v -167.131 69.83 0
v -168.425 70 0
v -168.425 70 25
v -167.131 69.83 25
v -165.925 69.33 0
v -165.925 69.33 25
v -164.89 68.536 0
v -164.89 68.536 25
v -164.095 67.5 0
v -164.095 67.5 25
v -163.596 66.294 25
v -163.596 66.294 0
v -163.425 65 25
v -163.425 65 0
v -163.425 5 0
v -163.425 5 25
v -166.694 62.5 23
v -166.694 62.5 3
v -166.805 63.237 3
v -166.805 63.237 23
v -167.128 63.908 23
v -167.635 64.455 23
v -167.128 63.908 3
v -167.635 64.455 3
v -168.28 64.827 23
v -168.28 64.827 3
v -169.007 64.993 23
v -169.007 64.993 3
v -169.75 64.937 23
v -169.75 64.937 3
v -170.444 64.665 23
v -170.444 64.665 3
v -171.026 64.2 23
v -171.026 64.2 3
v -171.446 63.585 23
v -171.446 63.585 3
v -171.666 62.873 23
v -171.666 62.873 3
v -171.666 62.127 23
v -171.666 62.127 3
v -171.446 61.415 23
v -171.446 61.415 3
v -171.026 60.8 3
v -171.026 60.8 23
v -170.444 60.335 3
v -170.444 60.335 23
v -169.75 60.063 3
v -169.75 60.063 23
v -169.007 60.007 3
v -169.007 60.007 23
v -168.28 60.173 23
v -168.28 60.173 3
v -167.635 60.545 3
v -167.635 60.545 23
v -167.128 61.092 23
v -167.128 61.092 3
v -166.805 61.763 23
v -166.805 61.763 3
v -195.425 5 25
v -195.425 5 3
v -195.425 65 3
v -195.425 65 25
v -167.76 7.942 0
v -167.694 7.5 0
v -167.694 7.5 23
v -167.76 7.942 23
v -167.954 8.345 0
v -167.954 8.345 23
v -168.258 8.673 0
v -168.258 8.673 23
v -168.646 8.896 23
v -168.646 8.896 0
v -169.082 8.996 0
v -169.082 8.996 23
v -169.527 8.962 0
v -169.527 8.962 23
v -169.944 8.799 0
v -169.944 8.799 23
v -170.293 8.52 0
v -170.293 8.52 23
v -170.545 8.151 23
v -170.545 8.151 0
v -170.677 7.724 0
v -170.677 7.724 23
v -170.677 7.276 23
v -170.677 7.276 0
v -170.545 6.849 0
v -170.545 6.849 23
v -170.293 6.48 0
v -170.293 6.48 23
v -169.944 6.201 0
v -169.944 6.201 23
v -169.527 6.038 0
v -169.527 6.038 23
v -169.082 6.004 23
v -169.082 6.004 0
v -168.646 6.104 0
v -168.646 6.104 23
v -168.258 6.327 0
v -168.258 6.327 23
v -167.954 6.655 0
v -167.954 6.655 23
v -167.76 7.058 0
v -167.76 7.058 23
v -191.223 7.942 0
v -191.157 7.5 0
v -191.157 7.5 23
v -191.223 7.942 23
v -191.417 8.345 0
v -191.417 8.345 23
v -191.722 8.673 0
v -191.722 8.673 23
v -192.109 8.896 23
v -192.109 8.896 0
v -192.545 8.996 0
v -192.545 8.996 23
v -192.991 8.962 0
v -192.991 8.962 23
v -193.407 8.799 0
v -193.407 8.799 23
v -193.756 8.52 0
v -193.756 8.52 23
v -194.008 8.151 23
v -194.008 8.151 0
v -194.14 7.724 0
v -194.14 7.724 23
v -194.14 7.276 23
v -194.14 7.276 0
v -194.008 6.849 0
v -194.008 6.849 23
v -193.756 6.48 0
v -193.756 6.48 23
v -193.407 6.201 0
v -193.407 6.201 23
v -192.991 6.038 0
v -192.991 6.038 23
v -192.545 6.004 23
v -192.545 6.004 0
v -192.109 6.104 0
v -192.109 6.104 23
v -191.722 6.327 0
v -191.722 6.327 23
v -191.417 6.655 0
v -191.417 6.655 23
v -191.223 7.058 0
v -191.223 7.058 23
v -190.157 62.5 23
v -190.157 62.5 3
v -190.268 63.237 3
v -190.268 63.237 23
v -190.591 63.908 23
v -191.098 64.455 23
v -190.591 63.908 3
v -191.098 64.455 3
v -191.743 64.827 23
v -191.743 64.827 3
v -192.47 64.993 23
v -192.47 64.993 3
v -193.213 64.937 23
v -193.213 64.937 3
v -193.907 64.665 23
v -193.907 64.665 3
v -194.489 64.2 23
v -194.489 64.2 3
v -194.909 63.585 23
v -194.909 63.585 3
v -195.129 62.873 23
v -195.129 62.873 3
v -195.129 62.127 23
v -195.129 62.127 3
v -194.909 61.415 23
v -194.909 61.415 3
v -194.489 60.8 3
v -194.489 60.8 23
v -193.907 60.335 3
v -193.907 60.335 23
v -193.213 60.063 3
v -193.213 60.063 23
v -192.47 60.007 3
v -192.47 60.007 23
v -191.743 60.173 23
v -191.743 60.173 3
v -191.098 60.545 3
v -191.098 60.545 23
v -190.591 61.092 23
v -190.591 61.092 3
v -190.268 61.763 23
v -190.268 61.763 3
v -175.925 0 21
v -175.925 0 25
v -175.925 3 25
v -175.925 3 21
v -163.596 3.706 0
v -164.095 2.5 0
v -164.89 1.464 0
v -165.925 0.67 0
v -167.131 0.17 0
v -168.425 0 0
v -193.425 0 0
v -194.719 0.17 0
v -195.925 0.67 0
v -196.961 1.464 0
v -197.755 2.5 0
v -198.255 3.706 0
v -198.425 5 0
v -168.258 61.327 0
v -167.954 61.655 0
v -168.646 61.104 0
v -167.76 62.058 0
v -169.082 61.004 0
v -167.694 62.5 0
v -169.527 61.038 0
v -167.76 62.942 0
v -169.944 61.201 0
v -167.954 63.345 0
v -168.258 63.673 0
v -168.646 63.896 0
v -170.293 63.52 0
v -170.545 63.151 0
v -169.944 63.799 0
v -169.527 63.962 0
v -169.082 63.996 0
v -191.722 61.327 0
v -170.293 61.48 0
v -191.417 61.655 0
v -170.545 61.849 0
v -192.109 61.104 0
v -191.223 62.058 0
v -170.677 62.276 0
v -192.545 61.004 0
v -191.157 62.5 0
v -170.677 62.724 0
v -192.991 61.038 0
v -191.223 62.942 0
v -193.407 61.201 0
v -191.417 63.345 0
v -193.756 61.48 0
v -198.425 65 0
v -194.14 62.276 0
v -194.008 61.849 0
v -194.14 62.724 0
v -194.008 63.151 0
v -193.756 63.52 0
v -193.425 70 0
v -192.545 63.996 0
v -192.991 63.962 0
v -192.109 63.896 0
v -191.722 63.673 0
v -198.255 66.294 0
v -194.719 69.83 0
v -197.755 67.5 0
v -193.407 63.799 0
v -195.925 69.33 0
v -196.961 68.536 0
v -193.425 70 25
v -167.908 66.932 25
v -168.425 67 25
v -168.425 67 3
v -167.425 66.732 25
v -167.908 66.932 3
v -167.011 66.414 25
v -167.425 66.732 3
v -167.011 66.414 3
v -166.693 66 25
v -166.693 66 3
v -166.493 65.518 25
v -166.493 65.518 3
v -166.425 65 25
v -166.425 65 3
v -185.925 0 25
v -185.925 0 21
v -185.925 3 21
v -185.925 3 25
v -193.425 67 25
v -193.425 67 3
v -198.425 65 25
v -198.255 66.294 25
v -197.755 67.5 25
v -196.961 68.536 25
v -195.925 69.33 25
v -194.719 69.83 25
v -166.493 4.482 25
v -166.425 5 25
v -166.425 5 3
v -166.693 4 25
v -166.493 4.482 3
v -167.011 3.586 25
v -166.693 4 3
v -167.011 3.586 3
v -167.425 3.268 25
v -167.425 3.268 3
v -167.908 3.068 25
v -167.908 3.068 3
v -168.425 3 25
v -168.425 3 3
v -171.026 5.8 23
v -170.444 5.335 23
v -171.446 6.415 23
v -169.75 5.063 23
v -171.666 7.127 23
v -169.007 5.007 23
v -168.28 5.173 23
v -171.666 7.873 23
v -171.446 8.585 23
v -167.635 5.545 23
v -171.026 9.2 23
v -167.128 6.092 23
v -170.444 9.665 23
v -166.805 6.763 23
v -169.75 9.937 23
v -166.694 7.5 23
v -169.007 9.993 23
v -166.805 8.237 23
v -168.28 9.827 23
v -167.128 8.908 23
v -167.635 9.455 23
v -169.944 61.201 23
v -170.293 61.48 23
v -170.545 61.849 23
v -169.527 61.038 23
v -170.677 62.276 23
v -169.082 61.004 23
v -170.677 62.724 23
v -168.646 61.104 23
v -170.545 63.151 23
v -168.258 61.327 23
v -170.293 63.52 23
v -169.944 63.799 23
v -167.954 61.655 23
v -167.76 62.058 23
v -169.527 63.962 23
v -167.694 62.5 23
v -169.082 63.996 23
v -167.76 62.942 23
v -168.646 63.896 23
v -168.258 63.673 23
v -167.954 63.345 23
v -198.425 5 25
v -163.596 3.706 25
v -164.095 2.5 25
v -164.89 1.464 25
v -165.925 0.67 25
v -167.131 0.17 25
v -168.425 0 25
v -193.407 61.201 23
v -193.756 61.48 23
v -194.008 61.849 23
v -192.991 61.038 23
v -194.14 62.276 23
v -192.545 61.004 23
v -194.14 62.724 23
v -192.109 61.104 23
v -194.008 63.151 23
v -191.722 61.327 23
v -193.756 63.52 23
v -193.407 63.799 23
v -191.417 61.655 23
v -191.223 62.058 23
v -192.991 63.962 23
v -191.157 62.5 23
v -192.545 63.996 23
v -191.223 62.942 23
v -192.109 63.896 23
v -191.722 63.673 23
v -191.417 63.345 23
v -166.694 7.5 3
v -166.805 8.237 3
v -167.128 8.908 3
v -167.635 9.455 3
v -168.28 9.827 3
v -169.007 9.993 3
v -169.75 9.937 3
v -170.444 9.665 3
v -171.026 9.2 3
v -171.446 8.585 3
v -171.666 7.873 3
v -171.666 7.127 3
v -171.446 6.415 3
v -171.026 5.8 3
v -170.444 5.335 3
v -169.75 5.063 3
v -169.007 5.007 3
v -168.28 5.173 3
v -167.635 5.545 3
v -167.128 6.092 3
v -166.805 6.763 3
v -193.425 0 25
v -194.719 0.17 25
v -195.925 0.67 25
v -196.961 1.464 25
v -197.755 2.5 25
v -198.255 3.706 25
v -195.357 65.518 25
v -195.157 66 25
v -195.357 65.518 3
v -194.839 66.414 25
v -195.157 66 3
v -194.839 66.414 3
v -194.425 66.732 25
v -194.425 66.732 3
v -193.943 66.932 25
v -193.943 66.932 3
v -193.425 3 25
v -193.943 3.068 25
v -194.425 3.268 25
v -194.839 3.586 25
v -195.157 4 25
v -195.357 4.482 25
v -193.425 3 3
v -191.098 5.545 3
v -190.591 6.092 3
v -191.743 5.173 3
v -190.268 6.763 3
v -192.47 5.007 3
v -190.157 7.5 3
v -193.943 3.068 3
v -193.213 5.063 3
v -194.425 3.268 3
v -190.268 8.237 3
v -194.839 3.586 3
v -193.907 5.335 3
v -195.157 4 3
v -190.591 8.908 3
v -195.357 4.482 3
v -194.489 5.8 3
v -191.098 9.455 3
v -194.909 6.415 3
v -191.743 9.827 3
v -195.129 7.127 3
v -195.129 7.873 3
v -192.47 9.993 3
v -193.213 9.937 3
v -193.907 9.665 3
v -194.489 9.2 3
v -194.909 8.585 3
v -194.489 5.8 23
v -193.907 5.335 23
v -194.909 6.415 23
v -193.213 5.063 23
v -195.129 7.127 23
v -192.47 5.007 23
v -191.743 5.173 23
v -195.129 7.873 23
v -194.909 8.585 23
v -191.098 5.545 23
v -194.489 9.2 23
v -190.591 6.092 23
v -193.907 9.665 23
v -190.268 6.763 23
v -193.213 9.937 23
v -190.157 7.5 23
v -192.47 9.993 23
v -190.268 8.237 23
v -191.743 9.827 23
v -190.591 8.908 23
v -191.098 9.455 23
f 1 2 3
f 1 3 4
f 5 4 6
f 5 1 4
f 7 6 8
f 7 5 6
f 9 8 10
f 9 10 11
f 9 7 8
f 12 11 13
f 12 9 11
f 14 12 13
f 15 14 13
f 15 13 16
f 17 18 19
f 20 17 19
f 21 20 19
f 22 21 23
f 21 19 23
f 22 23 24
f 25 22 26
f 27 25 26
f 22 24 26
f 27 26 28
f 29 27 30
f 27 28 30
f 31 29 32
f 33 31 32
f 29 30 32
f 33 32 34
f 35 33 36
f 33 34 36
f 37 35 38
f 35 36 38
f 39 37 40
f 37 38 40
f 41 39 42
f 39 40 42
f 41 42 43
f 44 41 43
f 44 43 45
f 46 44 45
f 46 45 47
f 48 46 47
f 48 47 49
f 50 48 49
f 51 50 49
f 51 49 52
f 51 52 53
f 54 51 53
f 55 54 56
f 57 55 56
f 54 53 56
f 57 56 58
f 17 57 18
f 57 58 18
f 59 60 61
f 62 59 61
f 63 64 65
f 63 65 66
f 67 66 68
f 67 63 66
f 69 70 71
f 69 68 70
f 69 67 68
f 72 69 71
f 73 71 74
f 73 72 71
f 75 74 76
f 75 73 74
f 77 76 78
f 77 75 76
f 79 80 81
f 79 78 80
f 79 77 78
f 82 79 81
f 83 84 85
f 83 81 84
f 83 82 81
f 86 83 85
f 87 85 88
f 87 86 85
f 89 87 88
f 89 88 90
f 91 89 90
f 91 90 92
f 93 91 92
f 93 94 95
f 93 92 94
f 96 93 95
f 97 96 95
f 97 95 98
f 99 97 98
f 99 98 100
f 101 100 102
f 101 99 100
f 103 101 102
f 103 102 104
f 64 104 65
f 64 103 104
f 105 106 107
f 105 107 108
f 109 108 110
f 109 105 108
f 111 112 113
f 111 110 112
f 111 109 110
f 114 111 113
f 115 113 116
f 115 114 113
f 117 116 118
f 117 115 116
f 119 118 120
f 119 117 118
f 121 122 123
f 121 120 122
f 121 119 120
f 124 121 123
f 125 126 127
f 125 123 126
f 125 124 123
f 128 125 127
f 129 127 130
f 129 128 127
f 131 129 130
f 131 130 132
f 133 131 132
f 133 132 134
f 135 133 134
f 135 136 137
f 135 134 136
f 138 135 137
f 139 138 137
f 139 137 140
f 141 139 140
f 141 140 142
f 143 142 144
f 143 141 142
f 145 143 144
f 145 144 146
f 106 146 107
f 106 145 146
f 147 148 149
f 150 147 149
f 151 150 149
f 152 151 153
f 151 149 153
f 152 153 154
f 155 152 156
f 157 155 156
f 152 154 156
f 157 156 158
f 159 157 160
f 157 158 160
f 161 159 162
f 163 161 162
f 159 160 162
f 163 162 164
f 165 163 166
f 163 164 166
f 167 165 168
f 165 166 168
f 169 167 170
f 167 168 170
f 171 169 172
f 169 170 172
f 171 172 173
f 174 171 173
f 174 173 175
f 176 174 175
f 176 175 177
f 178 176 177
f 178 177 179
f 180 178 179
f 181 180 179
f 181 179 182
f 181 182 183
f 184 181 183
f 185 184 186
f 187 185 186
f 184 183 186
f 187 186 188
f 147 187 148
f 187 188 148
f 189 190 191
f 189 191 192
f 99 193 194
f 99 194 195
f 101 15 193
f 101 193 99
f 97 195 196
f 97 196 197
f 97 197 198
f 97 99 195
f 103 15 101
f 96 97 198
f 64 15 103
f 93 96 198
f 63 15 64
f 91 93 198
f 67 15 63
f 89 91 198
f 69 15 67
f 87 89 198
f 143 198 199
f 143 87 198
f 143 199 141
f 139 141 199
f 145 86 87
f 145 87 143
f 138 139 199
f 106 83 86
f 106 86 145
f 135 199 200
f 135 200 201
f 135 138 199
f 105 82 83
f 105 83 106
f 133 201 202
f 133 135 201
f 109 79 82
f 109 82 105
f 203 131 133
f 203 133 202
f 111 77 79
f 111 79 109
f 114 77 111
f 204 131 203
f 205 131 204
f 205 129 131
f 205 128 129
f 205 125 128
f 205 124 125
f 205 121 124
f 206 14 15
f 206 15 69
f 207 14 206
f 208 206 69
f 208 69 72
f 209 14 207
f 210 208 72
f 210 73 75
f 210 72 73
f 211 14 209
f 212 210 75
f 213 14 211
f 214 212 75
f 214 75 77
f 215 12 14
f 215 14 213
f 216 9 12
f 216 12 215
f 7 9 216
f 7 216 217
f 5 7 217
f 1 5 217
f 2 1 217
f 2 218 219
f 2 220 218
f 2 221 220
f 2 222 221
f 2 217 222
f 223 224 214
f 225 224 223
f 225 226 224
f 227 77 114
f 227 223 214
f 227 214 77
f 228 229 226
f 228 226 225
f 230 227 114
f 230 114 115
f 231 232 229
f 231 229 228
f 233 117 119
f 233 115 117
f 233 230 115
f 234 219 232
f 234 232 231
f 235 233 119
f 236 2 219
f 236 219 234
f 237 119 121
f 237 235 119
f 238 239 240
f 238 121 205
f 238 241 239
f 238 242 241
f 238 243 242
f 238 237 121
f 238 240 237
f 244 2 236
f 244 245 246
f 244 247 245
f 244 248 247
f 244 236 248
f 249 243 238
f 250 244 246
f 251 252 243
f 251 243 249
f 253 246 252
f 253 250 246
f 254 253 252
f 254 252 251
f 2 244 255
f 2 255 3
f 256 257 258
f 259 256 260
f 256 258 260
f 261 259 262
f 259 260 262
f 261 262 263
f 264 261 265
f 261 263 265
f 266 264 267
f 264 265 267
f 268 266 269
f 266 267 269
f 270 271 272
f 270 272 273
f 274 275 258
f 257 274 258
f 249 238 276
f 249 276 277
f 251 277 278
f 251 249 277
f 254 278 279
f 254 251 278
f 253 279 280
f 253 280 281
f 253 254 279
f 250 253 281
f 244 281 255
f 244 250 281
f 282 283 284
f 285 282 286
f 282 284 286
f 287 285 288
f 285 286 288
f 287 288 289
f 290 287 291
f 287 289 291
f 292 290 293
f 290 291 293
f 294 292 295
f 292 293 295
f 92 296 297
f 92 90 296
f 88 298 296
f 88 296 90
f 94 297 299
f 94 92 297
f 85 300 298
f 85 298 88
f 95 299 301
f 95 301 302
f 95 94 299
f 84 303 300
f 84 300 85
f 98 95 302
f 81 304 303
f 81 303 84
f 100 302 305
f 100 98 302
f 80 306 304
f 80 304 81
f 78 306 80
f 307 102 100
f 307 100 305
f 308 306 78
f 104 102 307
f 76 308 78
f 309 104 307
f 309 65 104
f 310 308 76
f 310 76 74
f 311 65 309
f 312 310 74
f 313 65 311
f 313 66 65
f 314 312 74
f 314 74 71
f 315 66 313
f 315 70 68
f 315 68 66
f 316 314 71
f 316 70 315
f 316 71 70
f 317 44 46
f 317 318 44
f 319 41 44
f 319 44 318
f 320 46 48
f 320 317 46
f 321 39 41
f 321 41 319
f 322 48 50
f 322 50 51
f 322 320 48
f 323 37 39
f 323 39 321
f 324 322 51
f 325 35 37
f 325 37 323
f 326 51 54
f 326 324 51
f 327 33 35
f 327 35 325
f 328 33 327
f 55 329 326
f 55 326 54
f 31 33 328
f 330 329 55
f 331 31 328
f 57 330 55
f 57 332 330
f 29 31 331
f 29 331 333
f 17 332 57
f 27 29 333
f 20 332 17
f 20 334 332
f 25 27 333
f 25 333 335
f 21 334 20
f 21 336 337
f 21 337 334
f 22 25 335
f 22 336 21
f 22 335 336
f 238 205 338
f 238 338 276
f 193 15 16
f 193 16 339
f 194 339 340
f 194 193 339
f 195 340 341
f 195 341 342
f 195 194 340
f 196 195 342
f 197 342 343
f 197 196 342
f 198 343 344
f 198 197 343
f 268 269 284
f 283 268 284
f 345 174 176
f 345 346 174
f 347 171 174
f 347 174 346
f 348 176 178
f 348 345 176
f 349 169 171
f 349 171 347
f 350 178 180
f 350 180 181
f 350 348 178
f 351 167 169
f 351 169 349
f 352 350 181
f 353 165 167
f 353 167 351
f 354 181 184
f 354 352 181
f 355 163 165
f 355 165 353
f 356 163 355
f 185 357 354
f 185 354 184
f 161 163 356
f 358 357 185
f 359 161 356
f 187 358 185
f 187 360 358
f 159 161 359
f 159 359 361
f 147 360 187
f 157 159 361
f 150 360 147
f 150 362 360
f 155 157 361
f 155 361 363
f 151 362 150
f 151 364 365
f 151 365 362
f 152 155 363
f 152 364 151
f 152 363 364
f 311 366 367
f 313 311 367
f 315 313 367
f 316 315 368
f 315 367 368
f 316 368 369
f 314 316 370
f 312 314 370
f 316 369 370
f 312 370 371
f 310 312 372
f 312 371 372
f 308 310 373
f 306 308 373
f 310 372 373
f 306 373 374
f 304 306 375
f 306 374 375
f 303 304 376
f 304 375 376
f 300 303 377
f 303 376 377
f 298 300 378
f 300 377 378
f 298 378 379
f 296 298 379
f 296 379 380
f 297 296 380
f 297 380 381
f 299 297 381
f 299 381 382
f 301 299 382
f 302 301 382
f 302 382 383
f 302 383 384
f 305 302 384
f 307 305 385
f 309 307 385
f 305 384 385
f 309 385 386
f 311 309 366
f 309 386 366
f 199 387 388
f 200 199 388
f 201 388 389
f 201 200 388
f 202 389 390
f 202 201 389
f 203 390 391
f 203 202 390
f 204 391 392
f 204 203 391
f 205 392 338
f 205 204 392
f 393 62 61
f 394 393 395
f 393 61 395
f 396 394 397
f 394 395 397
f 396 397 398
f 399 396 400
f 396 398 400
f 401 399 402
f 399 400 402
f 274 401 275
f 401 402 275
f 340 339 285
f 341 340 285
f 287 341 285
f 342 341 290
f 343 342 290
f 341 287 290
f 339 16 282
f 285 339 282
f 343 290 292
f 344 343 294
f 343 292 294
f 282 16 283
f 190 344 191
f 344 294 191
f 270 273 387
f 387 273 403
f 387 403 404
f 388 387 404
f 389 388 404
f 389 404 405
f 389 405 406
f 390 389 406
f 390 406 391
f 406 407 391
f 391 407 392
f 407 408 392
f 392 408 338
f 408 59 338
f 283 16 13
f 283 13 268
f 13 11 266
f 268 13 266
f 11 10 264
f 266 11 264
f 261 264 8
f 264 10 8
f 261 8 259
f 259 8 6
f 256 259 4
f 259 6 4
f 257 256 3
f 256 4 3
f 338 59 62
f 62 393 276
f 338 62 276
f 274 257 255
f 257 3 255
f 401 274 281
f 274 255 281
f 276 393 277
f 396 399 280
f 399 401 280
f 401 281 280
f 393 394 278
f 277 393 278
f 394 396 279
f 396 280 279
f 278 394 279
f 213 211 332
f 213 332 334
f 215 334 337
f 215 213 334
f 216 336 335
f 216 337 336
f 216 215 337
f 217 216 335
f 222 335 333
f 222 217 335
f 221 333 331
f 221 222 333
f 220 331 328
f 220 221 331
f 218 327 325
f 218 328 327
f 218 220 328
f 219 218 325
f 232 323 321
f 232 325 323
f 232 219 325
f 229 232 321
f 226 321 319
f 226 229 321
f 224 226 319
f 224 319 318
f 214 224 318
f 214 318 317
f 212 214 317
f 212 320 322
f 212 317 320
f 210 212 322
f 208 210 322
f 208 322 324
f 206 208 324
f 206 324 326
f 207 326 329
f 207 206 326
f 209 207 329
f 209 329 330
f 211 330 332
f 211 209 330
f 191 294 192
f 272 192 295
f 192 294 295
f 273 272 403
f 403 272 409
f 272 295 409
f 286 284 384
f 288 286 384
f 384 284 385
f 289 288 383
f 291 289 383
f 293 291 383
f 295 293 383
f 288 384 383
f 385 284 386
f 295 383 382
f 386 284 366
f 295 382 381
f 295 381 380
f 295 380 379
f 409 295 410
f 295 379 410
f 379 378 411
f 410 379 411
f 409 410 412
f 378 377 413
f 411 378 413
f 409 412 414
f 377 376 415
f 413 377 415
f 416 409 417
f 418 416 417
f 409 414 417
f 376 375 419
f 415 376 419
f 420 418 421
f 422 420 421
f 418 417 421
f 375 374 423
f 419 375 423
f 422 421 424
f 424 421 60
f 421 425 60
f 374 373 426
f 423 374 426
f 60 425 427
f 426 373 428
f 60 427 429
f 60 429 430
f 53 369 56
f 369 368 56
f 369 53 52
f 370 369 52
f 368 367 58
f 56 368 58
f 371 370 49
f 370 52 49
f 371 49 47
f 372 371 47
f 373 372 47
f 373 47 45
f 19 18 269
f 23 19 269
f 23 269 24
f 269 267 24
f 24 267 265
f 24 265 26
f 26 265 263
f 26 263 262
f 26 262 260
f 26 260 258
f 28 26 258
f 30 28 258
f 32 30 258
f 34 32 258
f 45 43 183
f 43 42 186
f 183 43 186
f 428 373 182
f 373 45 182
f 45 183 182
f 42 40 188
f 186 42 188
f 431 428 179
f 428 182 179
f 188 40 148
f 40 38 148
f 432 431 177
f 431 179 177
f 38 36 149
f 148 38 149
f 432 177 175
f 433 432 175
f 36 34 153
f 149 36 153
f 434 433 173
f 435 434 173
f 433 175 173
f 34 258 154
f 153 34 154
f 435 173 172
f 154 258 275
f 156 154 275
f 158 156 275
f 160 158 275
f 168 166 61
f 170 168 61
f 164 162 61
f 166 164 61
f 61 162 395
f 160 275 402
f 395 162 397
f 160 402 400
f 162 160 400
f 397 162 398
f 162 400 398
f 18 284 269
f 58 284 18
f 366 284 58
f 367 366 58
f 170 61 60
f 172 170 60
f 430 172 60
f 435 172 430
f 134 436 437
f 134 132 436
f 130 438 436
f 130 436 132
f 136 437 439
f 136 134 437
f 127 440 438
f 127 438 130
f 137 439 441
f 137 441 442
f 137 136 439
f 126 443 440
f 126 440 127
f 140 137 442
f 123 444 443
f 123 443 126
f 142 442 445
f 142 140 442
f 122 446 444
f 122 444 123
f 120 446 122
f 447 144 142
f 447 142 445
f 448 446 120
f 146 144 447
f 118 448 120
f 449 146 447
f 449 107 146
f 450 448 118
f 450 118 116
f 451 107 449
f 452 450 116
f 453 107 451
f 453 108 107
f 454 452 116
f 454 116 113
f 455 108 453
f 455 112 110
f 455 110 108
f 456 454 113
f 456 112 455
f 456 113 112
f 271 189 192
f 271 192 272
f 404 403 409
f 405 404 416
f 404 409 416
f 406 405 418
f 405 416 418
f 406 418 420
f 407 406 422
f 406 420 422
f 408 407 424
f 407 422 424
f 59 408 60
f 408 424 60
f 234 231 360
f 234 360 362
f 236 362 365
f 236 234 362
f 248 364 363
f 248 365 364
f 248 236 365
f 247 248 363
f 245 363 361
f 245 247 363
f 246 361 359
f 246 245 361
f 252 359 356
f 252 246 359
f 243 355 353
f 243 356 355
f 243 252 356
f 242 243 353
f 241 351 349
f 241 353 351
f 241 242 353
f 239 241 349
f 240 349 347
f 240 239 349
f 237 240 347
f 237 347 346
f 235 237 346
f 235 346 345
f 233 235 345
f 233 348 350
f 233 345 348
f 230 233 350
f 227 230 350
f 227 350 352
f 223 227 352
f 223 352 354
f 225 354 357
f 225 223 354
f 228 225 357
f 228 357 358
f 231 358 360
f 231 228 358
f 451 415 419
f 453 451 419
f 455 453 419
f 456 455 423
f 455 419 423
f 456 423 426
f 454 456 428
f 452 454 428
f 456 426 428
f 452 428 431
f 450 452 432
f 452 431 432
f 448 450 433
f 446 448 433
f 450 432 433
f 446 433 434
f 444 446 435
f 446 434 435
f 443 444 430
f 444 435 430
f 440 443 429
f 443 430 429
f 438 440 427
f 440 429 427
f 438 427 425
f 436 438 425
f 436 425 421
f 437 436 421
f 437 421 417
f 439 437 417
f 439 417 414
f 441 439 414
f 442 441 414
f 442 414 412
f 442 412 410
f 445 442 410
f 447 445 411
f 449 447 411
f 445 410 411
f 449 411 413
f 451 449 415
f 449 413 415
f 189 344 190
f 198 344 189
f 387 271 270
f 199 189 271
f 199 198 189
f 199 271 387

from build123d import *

# Parameters (mm, degrees)
EXTRUDE_1_DEPTH           = 25
SHELL_2_T                 = -3
SKETCH_3_R                = 2.5
EXTRUDE_4_DEPTH           = 20
CUT_EXTRUDE_4_DEPTH       = 212.557459677
CUT_EXTRUDE_4_DEPTH_BACK  = 212.557459677
SKETCH_4_R                = 1.5
CUT_EXTRUDE_10_DEPTH      = 5
CUT_EXTRUDE_10_DEPTH_BACK = 212.890440429


with BuildPart() as part:
    # 草图1 → 凸台-拉伸1 (new body)
    with BuildSketch(Plane.XY):
        with BuildLine():
            Line((-193.42519685, 70), (-168.42519685, 70))
            ThreePointArc((-168.42519685, 70), (-164.889662944, 68.535533906), (-163.42519685, 65))
            Line((-163.42519685, 65), (-163.42519685, 5))
            ThreePointArc((-163.42519685, 5), (-164.889662944, 1.464466094), (-168.42519685, 0))
            Line((-168.42519685, 0), (-193.42519685, 0))
            ThreePointArc((-193.42519685, 0), (-196.960730756, 1.464466094), (-198.42519685, 5))
            Line((-198.42519685, 5), (-198.42519685, 65))
            ThreePointArc((-198.42519685, 65), (-196.960730756, 68.535533906), (-193.42519685, 70))
        make_face()
    extrude(amount=EXTRUDE_1_DEPTH)

    # 抽壳2
    shell_2_openings = [part.faces().sort_by_distance(p)[0] for p in [
        (-180.92519685, 35, 25),
    ]]
    offset(amount=SHELL_2_T, openings=shell_2_openings, kind=Kind.INTERSECTION)

    # 草图3 → 凸台-拉伸4 (add)
    with BuildSketch(Plane.XY.offset(3)):
        with Locations((-192.656739456, 62.5)):
            Circle(SKETCH_3_R)
        with Locations((-192.656739456, 7.5)):
            Circle(SKETCH_3_R)
        with Locations((-169.193654245, 62.5)):
            Circle(SKETCH_3_R)
        with Locations((-169.193654245, 7.5)):
            Circle(SKETCH_3_R)
    extrude(amount=EXTRUDE_4_DEPTH)

    # 草图4 → 切除-拉伸4 (cut, two sides: drawn at the far end of the back side and taken through both)
    with BuildSketch(Plane.XY.offset(3).offset(-CUT_EXTRUDE_4_DEPTH_BACK)):
        with Locations((-192.656739456, 62.5)):
            Circle(SKETCH_4_R)
        with Locations((-169.193654245, 62.5)):
            Circle(SKETCH_4_R)
        with Locations((-169.193654245, 7.5)):
            Circle(SKETCH_4_R)
        with Locations((-192.656739456, 7.5)):
            Circle(SKETCH_4_R)
    extrude(amount=CUT_EXTRUDE_4_DEPTH + CUT_EXTRUDE_4_DEPTH_BACK, mode=Mode.SUBTRACT)

    # 草图6 → 切除-拉伸10 (cut, two sides: drawn at the far end of the back side and taken through both)
    with BuildSketch(Plane(origin=(0, 0, 0), x_dir=(1, 0, 0), z_dir=(0, 1, 0)).offset(-CUT_EXTRUDE_10_DEPTH_BACK)):
        Polygon((-180.92519685, -25), (-175.92519685, -25), (-175.92519685, -21), (-185.92519685, -21), (-185.92519685, -25), align=None)
    extrude(amount=CUT_EXTRUDE_10_DEPTH + CUT_EXTRUDE_10_DEPTH_BACK, mode=Mode.SUBTRACT)


solid = part.part
